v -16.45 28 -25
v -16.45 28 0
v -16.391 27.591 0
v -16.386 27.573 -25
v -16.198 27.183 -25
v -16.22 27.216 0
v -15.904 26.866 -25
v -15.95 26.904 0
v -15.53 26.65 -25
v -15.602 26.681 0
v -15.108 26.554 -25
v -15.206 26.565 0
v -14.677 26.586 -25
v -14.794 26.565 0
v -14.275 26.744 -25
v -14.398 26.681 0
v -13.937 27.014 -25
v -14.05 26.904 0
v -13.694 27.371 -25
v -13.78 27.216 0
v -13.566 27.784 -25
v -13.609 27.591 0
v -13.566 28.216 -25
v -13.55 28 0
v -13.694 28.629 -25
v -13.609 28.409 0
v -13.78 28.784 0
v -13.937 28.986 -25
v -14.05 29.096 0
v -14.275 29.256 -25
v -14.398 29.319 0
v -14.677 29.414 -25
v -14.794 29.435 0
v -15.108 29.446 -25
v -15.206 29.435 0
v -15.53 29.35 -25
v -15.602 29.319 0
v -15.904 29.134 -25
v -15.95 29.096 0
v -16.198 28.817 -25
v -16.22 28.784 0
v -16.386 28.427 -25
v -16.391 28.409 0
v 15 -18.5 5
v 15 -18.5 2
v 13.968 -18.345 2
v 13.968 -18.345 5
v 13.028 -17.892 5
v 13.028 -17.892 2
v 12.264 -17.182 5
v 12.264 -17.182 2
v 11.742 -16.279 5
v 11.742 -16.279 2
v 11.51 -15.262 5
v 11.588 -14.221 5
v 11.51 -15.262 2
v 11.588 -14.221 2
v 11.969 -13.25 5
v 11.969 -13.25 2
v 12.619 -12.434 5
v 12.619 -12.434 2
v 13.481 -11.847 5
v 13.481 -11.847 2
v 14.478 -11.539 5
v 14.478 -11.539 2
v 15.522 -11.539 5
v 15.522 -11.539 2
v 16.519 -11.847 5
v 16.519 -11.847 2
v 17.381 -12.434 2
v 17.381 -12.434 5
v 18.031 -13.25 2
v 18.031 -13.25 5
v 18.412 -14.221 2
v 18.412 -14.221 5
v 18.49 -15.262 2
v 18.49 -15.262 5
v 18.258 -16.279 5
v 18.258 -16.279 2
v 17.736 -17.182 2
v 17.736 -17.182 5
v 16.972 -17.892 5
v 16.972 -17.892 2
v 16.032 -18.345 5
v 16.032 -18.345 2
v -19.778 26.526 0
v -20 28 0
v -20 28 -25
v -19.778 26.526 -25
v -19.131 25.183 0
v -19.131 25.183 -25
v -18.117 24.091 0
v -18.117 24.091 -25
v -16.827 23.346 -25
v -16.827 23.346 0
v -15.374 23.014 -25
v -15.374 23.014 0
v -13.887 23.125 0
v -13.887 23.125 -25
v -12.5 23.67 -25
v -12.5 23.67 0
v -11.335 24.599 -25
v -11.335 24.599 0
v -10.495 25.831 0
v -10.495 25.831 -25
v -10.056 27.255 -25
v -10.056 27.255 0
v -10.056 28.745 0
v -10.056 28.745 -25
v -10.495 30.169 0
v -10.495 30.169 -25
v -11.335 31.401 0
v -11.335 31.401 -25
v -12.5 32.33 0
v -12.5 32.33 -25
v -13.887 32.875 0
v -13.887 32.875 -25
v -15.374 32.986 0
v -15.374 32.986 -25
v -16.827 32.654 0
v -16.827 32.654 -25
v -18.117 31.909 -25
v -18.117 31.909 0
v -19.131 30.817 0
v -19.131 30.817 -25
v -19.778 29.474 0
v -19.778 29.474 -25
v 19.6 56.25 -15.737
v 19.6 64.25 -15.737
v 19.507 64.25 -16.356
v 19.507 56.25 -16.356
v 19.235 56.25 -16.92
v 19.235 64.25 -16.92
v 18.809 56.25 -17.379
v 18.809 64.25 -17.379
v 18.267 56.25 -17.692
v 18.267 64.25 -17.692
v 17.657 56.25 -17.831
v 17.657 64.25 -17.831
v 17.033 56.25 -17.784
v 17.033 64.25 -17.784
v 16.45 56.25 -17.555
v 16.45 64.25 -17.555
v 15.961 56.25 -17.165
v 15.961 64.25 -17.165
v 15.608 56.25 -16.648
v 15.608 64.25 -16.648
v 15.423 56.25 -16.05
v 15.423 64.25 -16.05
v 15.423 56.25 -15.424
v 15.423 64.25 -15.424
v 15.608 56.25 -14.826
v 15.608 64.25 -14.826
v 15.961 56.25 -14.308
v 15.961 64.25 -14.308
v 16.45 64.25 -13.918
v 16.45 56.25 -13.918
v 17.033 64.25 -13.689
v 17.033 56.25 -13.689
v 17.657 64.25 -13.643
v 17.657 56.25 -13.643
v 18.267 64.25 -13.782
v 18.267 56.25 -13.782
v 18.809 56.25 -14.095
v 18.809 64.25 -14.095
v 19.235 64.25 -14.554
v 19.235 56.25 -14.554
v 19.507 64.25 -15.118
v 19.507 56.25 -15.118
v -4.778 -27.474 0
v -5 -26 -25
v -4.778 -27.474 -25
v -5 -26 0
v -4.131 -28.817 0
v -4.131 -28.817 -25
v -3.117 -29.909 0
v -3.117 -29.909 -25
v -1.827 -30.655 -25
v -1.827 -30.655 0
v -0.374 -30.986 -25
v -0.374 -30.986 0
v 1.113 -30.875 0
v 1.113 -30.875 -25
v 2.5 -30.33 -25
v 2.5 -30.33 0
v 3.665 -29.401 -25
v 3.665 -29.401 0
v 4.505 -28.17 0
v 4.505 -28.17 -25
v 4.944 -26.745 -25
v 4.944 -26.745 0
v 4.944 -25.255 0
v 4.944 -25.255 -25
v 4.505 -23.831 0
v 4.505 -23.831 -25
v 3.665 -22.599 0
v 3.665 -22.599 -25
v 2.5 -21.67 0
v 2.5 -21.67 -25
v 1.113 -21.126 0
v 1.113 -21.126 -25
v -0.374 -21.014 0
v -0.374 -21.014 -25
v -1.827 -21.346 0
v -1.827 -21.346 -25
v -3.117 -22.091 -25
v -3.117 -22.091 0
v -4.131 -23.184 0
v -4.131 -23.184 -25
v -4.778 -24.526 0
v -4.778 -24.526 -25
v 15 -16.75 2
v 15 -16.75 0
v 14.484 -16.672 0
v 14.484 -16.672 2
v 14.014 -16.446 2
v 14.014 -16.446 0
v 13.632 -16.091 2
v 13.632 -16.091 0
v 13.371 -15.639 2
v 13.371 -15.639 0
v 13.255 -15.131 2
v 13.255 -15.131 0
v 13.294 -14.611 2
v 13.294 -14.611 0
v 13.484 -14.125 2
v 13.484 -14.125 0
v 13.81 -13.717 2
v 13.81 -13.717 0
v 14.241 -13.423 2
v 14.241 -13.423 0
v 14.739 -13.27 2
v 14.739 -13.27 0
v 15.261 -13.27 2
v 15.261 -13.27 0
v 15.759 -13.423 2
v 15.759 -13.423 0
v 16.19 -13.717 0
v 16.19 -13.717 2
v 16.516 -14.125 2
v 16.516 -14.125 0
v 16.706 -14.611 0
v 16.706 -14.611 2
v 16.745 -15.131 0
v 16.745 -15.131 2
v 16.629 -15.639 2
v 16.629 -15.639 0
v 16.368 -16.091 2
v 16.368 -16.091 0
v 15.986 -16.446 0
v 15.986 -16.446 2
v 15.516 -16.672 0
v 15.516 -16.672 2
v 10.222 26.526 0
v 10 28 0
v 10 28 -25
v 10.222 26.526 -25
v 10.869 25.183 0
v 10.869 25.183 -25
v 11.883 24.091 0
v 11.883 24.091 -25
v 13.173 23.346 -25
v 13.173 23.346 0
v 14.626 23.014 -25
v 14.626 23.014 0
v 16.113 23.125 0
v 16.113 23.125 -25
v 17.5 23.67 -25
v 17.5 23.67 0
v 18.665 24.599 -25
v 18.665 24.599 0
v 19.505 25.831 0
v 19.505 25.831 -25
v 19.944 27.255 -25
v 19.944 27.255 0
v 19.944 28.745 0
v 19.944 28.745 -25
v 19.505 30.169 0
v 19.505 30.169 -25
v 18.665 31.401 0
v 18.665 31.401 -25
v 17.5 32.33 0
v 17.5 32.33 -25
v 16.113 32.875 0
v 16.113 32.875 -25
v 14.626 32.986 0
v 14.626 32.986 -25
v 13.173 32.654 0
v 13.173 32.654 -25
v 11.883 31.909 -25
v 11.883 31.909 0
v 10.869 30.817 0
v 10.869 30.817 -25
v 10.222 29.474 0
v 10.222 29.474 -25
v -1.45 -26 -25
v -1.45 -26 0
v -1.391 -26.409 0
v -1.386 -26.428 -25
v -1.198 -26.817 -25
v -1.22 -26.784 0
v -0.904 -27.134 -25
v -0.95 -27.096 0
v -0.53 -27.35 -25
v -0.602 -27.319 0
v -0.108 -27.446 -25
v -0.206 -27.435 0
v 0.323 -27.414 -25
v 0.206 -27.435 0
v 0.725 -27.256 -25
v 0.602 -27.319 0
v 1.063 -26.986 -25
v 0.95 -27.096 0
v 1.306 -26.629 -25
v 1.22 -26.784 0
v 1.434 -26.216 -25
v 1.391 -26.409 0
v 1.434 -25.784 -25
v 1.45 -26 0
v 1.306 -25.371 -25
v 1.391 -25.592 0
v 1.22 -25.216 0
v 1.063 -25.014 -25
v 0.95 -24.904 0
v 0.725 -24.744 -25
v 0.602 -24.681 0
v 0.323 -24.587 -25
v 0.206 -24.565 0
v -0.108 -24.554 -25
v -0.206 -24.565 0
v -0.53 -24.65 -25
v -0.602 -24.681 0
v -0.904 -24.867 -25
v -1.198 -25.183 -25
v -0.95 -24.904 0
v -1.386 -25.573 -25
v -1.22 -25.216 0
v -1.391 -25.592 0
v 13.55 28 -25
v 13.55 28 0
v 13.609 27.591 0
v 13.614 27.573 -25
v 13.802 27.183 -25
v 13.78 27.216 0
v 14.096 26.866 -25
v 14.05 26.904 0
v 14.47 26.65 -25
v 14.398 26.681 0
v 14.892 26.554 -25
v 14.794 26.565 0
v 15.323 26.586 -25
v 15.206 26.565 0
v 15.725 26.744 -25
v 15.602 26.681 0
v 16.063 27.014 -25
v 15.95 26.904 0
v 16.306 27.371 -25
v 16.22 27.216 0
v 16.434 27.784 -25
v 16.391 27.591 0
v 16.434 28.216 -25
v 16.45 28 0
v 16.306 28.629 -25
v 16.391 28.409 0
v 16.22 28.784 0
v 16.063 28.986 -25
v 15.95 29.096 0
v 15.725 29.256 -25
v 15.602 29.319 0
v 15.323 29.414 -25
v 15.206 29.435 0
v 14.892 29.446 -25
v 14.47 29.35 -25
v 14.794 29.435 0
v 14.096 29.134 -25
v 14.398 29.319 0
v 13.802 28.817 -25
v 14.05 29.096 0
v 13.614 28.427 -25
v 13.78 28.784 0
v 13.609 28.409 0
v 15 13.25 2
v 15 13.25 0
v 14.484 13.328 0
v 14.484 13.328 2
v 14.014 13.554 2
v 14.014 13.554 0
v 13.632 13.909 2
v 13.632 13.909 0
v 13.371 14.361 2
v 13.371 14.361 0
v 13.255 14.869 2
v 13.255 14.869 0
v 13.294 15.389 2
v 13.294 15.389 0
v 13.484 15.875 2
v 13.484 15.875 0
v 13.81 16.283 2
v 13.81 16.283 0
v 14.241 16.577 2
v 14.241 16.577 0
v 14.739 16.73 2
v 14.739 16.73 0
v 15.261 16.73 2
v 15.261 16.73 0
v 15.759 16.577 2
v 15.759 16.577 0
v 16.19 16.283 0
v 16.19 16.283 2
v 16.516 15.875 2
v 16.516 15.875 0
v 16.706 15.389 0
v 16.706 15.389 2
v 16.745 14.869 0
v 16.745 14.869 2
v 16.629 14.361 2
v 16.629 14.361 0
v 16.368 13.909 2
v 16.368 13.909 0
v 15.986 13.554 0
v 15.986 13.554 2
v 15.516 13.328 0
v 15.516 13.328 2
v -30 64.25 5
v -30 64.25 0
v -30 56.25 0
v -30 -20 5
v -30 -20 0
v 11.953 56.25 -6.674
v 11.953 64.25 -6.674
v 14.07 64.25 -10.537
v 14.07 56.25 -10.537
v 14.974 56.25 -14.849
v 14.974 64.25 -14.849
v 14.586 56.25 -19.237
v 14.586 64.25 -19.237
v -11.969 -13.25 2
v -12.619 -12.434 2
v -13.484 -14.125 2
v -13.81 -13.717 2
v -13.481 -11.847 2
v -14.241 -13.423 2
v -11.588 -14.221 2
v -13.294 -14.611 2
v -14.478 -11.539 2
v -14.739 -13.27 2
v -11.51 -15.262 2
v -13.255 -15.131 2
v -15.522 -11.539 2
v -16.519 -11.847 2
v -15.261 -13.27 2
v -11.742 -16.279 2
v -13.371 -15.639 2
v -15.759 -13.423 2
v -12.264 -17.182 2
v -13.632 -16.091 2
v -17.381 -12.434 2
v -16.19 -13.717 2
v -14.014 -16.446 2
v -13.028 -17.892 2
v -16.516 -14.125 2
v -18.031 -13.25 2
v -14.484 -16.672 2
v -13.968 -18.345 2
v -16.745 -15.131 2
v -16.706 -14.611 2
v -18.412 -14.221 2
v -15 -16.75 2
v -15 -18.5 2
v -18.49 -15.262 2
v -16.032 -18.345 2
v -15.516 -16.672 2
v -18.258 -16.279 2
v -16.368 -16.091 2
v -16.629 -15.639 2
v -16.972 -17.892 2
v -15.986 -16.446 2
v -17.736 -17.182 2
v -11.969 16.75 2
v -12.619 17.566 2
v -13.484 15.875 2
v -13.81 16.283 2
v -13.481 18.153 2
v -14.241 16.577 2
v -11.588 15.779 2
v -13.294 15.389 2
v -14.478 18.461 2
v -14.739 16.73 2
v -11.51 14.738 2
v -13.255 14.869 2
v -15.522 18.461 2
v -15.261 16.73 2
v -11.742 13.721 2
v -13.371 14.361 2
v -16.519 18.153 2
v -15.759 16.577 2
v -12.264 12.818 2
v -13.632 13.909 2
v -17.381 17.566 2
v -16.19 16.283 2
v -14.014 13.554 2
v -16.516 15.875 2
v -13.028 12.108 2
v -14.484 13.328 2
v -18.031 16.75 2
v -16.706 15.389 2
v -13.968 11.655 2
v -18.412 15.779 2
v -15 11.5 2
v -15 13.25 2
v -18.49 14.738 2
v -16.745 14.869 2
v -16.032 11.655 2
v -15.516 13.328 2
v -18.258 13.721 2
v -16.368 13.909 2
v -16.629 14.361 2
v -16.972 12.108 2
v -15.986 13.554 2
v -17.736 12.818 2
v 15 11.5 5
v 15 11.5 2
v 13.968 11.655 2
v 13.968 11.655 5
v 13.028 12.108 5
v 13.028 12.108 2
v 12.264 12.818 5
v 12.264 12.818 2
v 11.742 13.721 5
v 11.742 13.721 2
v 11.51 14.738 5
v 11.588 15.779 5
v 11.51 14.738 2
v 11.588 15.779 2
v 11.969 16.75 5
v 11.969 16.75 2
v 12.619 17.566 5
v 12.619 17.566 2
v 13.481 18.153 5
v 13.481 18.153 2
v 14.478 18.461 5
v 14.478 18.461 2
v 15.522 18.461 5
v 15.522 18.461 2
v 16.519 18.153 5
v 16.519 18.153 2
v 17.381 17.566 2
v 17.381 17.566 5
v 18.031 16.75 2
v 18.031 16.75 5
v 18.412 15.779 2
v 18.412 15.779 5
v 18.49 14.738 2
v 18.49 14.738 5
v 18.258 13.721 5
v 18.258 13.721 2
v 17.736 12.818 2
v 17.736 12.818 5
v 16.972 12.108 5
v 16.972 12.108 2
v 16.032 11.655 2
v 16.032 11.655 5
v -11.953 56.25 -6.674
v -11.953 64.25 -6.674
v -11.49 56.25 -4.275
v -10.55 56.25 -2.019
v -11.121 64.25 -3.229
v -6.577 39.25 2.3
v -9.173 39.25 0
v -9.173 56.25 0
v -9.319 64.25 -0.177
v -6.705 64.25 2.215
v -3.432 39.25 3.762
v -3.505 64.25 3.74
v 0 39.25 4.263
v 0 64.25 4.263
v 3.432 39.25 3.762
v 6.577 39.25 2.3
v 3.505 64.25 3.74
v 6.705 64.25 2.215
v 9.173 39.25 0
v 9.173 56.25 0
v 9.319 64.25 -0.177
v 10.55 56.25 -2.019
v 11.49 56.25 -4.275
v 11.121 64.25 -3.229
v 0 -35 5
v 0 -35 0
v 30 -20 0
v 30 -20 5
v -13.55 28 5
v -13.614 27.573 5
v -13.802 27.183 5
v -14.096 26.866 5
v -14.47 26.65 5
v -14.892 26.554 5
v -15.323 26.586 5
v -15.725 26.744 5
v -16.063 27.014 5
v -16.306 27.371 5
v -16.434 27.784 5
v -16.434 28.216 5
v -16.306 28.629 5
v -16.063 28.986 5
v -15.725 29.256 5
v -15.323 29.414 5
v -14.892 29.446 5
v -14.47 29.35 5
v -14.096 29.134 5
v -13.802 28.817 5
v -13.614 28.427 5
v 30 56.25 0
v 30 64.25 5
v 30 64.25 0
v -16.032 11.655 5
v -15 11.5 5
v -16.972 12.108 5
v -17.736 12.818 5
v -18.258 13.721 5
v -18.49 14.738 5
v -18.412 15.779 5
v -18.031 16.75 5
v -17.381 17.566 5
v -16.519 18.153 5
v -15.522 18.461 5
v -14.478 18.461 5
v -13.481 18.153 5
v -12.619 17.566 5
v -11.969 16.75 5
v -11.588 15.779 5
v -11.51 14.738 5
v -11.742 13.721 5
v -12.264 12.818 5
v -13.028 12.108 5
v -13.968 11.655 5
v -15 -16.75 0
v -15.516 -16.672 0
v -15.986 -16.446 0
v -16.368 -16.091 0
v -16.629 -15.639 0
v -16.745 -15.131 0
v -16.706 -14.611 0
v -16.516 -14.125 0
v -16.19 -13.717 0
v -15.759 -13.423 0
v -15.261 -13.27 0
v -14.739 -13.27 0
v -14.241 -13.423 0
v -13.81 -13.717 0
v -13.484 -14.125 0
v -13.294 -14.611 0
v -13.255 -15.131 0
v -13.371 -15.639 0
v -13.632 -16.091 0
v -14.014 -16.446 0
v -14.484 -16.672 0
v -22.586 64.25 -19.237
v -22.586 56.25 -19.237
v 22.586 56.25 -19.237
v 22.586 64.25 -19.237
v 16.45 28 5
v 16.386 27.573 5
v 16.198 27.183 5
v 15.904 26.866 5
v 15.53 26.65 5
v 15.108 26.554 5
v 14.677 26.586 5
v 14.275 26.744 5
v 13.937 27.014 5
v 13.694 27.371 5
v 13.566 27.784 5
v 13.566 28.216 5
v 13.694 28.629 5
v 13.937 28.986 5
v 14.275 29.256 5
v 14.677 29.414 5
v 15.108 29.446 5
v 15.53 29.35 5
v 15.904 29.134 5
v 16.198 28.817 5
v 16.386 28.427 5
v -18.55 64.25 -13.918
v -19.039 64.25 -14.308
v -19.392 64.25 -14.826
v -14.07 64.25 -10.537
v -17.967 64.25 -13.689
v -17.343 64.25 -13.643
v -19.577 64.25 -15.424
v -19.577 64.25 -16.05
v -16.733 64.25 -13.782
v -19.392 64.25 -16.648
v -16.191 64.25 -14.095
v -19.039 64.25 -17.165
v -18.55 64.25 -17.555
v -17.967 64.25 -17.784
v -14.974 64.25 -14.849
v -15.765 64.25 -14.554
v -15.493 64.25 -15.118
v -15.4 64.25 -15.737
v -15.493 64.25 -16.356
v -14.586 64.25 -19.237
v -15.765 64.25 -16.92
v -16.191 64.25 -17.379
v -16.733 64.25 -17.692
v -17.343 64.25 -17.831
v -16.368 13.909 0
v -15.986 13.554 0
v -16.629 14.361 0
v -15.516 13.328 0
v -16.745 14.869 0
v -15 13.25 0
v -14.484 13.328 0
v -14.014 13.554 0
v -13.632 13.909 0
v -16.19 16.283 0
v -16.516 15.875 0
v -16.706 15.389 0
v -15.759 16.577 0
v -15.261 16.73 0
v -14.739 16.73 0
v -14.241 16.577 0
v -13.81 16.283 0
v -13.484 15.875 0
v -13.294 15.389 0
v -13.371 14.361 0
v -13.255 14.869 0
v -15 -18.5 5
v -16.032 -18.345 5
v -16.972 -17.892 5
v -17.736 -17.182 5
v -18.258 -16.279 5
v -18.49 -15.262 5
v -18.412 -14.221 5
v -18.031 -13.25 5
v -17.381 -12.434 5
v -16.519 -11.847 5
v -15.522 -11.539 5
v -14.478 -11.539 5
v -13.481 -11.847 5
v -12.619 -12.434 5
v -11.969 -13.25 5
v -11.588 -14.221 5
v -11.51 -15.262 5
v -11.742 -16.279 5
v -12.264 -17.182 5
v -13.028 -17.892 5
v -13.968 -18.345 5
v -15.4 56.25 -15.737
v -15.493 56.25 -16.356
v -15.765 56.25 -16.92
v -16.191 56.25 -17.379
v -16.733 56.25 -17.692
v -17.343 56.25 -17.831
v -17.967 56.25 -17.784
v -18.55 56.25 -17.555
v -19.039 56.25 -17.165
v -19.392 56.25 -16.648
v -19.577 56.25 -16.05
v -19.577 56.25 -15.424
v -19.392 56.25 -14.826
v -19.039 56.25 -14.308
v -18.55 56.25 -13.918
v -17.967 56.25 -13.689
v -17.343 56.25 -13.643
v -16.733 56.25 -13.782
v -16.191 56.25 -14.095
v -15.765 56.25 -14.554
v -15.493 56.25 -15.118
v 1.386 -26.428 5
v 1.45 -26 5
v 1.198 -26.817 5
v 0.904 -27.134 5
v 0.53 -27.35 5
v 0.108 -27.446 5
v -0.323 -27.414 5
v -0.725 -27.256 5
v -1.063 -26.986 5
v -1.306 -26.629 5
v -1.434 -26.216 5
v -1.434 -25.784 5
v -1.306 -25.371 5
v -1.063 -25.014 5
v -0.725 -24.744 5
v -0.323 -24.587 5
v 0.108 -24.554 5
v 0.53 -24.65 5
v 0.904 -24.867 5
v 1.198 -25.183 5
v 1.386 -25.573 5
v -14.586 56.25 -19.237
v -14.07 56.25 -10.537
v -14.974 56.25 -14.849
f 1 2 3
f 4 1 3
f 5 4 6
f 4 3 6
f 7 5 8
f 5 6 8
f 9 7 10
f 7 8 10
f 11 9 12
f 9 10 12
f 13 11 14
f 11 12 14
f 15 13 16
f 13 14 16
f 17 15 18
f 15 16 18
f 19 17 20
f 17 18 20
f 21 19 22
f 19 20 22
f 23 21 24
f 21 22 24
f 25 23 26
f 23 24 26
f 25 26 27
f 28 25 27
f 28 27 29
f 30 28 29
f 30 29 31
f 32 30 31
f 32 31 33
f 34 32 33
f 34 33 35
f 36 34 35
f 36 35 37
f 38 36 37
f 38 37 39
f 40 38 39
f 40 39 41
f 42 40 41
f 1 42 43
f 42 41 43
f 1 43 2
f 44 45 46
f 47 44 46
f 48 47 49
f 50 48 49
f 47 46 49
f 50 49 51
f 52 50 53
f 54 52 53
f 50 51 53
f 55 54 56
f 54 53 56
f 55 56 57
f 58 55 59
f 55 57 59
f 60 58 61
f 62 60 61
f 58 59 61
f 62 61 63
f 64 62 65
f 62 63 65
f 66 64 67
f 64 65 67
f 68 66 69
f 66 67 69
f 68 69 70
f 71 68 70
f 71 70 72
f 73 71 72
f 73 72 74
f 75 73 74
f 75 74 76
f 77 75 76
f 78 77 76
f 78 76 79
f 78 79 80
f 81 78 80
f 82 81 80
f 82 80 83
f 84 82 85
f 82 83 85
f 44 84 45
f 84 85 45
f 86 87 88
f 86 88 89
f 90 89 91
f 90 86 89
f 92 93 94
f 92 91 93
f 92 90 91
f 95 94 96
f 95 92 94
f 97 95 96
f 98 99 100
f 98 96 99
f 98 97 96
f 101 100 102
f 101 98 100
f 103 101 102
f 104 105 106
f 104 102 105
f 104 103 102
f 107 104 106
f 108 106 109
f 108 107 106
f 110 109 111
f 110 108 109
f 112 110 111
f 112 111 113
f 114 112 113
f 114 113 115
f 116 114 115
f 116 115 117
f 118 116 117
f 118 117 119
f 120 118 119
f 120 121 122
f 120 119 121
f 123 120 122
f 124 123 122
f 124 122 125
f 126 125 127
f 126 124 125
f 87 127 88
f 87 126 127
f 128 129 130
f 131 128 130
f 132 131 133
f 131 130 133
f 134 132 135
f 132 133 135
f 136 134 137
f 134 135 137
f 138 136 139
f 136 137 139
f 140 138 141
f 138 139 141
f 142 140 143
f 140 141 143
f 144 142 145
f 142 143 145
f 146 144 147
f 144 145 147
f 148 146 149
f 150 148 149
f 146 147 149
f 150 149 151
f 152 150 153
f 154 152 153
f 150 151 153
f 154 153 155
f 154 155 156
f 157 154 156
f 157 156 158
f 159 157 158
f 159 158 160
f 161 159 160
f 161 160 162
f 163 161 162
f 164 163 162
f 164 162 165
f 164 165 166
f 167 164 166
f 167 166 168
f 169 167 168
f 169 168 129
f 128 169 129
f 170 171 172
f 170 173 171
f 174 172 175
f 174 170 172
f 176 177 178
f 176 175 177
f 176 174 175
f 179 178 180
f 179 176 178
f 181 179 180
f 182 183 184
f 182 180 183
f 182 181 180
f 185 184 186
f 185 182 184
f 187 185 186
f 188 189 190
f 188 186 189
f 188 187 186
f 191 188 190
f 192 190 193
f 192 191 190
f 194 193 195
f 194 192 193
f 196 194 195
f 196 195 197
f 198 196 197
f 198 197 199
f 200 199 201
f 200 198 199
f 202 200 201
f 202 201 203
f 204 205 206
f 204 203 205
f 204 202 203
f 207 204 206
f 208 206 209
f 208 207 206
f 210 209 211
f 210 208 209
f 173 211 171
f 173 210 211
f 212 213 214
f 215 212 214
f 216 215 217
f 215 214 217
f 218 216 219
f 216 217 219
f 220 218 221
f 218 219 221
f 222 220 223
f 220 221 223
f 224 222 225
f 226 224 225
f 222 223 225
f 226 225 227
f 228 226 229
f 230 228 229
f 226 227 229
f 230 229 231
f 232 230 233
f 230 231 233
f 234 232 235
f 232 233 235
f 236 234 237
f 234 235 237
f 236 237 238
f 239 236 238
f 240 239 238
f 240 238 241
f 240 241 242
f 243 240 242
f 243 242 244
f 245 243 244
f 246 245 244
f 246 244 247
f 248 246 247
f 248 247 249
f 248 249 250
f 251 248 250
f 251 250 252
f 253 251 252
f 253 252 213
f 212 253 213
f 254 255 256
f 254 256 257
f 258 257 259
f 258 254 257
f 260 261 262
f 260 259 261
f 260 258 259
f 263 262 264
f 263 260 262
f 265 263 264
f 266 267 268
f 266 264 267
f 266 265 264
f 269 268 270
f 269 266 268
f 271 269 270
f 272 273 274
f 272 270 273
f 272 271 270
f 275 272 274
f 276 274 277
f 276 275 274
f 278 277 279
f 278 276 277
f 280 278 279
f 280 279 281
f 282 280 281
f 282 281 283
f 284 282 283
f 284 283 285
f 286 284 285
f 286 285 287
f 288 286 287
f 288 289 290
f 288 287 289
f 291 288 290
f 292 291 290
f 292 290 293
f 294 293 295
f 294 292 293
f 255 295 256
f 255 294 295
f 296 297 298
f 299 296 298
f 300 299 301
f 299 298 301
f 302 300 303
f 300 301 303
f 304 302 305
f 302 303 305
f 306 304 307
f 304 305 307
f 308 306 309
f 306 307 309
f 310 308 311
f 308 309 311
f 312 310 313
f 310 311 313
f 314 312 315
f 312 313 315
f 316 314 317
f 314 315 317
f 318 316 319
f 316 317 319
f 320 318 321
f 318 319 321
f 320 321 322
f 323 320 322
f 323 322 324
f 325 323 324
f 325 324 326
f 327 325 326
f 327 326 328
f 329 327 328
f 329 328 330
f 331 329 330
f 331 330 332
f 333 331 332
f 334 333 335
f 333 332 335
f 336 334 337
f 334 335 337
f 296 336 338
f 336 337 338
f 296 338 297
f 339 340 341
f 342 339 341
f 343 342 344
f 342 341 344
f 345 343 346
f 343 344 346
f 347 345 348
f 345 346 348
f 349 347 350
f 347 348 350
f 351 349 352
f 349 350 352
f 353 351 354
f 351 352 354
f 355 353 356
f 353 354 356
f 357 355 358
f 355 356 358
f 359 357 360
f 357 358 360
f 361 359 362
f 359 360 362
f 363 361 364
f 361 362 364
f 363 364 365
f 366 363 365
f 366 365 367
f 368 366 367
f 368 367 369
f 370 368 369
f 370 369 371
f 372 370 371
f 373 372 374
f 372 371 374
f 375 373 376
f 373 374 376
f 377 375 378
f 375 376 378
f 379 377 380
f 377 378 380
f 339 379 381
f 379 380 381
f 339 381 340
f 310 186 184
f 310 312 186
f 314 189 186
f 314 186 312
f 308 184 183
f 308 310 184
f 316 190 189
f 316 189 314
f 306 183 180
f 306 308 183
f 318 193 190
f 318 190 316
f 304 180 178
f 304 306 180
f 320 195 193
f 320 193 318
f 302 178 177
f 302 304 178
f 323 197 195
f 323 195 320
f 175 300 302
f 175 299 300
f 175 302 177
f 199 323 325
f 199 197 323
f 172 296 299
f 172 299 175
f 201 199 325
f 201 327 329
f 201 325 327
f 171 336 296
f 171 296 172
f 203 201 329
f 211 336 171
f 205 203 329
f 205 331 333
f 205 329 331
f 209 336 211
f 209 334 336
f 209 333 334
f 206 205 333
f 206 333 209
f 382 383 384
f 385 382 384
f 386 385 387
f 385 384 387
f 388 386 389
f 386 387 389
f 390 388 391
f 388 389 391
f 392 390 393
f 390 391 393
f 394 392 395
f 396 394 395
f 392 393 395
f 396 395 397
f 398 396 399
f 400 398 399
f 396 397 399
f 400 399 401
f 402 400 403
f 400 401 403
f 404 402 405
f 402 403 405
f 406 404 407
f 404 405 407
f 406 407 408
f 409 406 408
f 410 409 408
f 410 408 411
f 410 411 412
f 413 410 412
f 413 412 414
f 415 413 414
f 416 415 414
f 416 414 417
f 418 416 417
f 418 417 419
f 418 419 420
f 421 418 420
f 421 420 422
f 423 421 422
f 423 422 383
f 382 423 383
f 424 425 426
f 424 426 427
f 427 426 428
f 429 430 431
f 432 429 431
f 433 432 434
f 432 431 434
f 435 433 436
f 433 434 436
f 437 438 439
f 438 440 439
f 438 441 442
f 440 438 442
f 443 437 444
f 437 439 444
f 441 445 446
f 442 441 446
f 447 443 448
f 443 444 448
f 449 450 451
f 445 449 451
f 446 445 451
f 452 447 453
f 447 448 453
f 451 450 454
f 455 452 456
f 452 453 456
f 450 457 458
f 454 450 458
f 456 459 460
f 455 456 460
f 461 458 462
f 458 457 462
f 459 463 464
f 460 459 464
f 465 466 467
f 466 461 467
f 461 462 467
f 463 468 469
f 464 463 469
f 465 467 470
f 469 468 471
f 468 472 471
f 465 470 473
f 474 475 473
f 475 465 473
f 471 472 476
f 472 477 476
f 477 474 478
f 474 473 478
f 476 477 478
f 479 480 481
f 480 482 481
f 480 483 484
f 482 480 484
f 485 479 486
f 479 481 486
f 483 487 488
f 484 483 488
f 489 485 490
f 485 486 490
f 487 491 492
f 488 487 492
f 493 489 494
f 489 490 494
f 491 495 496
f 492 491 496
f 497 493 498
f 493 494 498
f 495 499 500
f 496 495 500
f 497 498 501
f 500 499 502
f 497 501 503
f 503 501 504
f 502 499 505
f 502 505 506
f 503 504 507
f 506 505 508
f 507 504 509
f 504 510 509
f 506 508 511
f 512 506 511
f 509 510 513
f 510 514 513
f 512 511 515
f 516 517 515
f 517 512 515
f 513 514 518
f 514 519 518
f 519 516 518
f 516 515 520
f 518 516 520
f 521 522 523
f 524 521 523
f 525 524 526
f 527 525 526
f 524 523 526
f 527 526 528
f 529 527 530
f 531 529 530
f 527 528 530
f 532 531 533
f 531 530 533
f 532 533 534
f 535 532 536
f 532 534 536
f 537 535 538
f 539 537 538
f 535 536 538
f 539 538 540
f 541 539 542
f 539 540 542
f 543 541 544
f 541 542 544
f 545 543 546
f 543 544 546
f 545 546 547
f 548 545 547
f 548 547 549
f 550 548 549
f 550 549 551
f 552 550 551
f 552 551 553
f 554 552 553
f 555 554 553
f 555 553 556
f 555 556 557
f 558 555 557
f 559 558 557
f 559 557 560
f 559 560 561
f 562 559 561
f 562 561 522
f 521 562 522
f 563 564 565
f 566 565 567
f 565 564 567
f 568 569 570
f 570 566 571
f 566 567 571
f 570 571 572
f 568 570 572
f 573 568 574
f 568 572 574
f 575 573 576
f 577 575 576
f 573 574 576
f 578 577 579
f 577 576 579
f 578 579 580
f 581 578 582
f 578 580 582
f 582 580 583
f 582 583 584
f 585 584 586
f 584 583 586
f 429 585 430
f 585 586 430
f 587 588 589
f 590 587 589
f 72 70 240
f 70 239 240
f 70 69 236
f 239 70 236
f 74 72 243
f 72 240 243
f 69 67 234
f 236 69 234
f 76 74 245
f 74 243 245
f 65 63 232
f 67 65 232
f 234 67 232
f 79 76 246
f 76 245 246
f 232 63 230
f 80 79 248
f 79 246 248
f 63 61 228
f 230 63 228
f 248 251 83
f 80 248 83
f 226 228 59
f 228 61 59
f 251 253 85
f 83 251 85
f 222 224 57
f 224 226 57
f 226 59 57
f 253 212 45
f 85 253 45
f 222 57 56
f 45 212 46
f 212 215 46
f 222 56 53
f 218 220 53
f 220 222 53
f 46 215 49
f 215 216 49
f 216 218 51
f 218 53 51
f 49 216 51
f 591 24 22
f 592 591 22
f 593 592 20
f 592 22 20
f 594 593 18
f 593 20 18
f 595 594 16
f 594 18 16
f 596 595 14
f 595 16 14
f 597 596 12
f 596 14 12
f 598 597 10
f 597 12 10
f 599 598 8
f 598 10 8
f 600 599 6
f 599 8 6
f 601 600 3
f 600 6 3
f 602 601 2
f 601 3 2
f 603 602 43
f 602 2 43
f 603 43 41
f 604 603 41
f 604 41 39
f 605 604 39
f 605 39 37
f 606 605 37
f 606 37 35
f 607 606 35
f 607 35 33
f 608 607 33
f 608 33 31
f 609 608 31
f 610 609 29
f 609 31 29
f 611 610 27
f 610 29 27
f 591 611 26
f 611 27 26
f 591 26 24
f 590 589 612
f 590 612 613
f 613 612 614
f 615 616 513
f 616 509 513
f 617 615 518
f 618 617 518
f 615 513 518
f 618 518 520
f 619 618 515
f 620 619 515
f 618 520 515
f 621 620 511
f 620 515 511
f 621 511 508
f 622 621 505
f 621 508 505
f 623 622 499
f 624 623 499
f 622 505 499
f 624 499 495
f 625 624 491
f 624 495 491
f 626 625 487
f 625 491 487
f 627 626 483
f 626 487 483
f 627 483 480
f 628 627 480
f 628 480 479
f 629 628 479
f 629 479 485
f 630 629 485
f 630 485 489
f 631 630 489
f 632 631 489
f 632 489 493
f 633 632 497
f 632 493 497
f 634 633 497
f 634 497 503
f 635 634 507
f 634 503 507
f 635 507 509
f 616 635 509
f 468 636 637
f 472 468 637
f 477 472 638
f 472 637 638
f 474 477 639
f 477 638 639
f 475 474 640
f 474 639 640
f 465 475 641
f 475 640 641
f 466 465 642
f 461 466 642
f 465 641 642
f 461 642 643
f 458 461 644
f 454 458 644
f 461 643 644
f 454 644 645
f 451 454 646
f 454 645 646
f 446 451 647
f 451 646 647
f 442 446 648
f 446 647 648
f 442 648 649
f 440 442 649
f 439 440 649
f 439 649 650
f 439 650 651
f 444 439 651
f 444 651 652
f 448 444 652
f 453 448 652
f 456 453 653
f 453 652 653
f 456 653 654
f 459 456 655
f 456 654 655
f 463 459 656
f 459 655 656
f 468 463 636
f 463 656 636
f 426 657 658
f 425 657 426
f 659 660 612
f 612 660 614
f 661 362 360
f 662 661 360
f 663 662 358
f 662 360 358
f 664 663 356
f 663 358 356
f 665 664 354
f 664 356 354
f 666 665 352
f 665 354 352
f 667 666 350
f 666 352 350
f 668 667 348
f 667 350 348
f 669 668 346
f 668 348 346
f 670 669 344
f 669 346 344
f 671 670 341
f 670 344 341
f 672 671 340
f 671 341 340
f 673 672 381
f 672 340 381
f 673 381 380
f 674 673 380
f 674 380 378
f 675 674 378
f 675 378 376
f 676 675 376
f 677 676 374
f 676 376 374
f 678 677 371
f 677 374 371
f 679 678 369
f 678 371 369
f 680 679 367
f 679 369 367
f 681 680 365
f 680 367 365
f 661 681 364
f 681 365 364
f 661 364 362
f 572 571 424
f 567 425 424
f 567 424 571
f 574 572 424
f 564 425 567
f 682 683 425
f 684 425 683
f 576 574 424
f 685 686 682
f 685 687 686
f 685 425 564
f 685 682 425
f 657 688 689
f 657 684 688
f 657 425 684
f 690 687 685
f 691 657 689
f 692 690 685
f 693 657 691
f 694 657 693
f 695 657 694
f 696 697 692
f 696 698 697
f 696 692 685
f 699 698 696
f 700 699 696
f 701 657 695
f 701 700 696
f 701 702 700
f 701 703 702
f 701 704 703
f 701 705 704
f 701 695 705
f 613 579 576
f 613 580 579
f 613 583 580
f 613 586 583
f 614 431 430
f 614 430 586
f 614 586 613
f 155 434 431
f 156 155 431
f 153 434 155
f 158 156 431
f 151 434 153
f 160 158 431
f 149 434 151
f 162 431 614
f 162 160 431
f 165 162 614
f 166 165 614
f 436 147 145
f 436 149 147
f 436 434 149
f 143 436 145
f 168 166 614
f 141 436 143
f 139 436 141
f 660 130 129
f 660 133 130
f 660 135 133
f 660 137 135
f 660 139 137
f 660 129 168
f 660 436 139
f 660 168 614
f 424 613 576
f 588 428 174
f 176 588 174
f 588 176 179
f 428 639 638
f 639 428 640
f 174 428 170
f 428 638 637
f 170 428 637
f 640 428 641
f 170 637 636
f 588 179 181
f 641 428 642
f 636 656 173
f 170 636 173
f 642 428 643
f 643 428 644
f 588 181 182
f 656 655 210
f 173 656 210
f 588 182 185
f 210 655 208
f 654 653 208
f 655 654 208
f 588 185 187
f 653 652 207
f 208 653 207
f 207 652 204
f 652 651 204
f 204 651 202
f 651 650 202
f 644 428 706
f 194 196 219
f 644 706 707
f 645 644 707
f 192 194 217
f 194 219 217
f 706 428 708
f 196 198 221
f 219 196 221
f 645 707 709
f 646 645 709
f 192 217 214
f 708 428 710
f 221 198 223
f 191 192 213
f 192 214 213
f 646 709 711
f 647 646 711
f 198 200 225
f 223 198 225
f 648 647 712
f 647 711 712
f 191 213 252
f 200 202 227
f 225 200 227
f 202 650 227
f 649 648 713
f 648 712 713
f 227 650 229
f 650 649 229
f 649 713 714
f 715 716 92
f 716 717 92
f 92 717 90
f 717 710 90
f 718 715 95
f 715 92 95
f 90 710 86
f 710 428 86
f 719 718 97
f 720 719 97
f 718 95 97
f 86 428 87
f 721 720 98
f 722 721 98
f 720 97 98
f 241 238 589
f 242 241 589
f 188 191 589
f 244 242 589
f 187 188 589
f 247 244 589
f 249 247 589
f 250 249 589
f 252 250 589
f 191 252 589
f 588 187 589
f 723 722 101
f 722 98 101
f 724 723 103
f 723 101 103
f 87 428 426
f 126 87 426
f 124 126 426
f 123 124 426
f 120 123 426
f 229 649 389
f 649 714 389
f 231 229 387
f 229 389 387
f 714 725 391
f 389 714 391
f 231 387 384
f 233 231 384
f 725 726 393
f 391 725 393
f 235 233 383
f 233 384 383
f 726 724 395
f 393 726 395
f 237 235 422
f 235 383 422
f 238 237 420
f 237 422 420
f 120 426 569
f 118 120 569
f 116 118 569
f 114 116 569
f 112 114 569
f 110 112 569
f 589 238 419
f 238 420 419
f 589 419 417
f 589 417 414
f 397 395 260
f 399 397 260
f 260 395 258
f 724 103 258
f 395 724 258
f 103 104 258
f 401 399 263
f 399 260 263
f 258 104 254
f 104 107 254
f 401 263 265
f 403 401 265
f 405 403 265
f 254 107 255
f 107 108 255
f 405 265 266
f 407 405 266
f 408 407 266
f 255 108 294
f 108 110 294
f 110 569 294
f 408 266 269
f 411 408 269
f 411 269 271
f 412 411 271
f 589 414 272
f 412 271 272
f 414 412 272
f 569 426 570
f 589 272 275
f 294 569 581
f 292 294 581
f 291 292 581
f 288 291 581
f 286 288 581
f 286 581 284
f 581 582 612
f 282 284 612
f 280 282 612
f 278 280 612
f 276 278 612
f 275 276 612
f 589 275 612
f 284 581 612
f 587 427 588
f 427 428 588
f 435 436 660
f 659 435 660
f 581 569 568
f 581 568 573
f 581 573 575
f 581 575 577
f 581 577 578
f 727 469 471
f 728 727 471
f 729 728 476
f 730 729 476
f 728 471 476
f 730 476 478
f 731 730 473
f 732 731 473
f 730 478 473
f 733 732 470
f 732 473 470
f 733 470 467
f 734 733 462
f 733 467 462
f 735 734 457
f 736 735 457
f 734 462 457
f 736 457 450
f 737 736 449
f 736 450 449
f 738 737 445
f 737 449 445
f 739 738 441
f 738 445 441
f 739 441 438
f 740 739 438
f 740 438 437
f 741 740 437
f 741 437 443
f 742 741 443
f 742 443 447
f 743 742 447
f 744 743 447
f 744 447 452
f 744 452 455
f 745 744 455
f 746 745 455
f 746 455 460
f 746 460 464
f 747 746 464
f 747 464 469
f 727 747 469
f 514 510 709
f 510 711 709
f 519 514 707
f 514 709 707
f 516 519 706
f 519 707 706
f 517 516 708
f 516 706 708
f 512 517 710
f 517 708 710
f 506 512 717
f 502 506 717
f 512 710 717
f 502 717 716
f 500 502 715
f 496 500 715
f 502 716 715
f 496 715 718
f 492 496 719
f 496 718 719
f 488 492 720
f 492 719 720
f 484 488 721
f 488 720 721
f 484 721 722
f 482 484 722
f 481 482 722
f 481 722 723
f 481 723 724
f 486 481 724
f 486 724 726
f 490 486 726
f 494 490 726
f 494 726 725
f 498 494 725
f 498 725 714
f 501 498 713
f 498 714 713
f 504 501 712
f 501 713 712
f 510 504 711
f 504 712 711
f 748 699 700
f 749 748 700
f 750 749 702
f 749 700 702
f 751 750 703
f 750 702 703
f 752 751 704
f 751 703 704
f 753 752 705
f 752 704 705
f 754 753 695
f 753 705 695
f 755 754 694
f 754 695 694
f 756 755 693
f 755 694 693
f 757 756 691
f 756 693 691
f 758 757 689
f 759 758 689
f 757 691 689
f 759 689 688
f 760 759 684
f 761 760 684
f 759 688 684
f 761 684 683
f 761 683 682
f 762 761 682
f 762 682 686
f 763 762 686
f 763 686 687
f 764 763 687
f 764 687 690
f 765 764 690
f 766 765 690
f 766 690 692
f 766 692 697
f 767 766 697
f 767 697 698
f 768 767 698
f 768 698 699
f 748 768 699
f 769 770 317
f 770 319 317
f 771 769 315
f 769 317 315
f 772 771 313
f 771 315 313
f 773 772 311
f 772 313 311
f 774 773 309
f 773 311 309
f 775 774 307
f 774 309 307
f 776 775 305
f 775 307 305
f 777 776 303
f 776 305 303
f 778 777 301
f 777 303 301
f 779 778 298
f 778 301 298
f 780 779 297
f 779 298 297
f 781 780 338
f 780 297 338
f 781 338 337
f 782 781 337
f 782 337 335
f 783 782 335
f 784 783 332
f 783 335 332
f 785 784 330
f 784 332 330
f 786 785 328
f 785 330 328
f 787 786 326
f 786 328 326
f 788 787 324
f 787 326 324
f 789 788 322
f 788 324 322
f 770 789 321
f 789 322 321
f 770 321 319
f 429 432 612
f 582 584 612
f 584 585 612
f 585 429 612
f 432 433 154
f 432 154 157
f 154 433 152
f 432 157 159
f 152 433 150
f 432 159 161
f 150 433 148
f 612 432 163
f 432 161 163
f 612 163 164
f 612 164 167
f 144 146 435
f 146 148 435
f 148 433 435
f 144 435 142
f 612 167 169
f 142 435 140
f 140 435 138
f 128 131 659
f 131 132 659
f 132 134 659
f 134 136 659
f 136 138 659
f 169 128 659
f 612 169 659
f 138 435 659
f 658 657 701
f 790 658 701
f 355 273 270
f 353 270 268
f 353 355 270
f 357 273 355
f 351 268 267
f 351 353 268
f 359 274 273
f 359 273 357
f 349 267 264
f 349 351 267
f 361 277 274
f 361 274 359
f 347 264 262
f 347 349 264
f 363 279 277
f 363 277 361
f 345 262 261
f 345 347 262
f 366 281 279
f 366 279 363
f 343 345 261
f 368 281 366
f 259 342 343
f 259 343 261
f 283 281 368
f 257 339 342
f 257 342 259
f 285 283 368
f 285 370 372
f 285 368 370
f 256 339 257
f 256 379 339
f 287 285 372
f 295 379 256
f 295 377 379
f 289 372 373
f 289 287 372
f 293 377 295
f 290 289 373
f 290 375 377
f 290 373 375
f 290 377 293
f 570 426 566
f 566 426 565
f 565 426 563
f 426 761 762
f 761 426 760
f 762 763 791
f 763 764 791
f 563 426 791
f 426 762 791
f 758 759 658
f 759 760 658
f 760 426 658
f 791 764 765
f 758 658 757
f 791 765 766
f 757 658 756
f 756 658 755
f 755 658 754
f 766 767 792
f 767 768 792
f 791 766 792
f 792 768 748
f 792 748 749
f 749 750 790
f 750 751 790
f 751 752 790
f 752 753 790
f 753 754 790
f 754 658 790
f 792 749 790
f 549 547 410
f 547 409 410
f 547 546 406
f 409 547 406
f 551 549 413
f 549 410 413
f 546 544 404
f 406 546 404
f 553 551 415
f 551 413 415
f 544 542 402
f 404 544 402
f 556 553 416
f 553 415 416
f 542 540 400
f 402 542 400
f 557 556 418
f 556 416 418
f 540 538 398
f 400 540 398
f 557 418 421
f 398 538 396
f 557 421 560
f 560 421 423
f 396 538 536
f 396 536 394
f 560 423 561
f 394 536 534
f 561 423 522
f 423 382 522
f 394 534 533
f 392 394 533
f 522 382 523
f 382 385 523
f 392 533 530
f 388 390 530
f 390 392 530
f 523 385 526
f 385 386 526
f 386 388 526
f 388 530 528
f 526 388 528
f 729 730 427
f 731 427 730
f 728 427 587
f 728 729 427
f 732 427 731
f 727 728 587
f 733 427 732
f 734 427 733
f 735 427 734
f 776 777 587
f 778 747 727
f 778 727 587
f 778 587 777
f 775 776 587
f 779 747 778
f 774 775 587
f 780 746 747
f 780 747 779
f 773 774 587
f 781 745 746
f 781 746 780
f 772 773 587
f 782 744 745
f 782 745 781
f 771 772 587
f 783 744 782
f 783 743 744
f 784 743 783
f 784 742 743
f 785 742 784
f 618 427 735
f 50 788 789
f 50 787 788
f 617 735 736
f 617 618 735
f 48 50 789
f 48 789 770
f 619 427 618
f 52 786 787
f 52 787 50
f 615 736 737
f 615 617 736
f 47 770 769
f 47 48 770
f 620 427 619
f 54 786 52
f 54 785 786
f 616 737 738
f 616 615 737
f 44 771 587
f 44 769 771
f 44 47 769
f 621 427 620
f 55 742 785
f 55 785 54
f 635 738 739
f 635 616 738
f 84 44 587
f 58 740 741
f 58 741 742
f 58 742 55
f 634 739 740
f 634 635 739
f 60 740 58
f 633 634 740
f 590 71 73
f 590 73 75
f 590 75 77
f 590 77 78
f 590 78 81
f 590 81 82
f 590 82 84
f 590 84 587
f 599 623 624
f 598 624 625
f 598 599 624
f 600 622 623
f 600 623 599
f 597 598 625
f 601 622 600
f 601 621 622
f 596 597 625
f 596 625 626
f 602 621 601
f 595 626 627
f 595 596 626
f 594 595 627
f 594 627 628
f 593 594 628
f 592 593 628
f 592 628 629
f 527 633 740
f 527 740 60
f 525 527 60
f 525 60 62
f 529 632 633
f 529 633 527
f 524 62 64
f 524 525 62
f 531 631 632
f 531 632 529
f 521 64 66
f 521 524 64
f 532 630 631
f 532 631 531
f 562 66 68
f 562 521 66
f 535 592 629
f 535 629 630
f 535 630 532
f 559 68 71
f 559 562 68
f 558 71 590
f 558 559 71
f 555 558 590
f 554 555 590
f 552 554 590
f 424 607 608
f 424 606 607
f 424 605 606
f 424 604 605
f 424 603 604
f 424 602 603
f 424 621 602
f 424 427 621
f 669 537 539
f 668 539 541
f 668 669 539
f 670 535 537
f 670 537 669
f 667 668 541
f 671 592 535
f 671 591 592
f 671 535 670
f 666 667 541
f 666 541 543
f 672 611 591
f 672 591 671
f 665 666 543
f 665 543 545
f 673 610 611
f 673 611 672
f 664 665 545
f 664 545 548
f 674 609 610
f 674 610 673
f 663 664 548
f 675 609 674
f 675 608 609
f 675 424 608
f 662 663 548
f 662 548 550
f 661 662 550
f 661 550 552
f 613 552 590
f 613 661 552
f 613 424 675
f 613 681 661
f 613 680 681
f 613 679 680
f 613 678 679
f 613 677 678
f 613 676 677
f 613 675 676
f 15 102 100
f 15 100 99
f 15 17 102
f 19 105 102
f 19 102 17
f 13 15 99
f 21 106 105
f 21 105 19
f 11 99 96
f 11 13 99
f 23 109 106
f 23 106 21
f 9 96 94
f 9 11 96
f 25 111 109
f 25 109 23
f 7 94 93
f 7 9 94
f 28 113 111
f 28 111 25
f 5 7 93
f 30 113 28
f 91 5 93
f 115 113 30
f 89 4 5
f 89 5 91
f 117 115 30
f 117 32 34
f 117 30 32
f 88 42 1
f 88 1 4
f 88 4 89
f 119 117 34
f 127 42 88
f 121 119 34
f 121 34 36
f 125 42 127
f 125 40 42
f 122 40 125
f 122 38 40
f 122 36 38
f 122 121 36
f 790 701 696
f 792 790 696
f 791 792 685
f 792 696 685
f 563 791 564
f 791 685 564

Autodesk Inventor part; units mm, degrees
ref_plane "YZ Plane" through (0, 0, 0) normal (1, 0, 0) x (0, 1, 0)
ref_plane "XZ Plane" through (0, 0, 0) normal (0, 1, 0) x (-1, 0, 0)
ref_plane "XY Plane" through (0, 0, 0) normal (0, 0, 1) x (1, 0, 0)
ref_plane "Work Plane1" through (0, 0, 0) normal (0, 0, 1) x (1, 0, 0)
sketch "Sketch1" plane through (0, 0, 0) normal (0, 0, 1) x (1, 0, 0)
  circle A0 centre (-15, -15) radius 1.5 projected
  circle A1 centre (15, 15) radius 1.5 projected
  circle A2 centre (15, -15) radius 1.5 projected
  circle A3 centre (-15, 15) radius 1.5 projected
  line L0 (30, 20) -> (-30, 20) construction
  line L1 (-30, 20) -> (-30, -20) projected
  line L2 (-30, -20) -> (30, -20) projected
  line L3 (30, -20) -> (30, 20) projected
  line L4 (30, 20) -> (-30, 20)
  line L5 (-30, 20) -> (-30, 64.25)
  line L6 (-30, 64.25) -> (30, 64.25)
  line L7 (30, 64.25) -> (30, 20)
  line L8 (13.5554, 64.25) -> (17.5, 64.25) projected
  line L9 (-30, -20) -> (0, -35)
  line L10 (0, -35) -> (30, -20)
  line L11 (-0.0001, -26) -> (-15, 28) construction
  line L12 (-15, 28) -> (15, 28) construction
  line L13 (15, 28) -> (-0.0001, -26) construction
  circle A4 centre (-15, 28) radius 1.45
  circle A5 centre (15, 28) radius 1.45
  circle A6 centre (0, -26.0002) radius 1.45
  line L14 (-30, -20) -> (30, -20)
  line L15 (30, -20) -> (30, 20)
  line L16 (30, 20) -> (-30, 20)
  line L17 (-30, 20) -> (-30, -20)
  point P0 (0, 0)
  dimension "d19" = 15
  dimension "d20" = 2.9
  dimension "d21" = 2.9
  dimension "d22" = 2.9
  dimension "d23" = 30
  dimension "d24" = 28
  dimension "d30" = 0
  dimension "d31" = 26
extrude "Extrusion1" add sketch "Sketch1" along normal blind 5 contours A0 | A1 | A2 | A3 | L4 L3 L2 L1 | L5 L6 L7 L4 | L2 L10 L9
sketch "Sketch2" plane through (0, 0, 5) normal (0, 0, 1) x (1, 0, 0)
  circle A0 centre (15, 15) radius 1.5 projected
  circle A1 centre (15, -15) radius 1.5 projected
  circle A2 centre (-20, 13) radius 1.5 projected
  circle A3 centre (-20, -13) radius 1.5 projected
  circle A4 centre (-15, -15) radius 1.5 projected
  circle A5 centre (-15, 15) radius 1.5 projected
  point P0 (0, 0)
hole "Hole1" at (15, 15, 5) at (15, -15, 5) at (-15, -15, 5) at (-15, 15, 5) direction (0, 0, -1) diameter 3.5 depth 8 tip angle 118 counterbore diameter 7 counterbore depth 3
sketch "Sketch3" plane through (-30, 64.25, 0) normal (0, 1, 0) x (1, 0, 0)
  circle A0 centre (12.5, 15.7367) radius 2.1 projected
  circle A1 centre (47.5, 15.7367) radius 2.1 projected
  arc A2 (16, 15.7367) -> (44, 15.7367) centre (30, 15.7367) ccw projected
  circle A3 centre (30, 15.7367) radius 15
  line L0 (12.5, 19.2367) -> (16.4446, 19.2367) projected
  line L1 (43.5554, 19.2367) -> (47.5, 19.2367) projected
  line L2 (15.414, 19.2367) -> (7.414, 19.2367)
  line L3 (0, 0) -> (60, 0) projected
  line L4 (7.414, 19.2367) -> (0, 0)
  line L5 (0, 0) -> (60, 0)
  line L6 (44.586, 19.2367) -> (52.586, 19.2367)
  line L7 (52.586, 19.2367) -> (60, 0)
  circle A4 centre (12.5, 15.7367) radius 1.45
  circle A5 centre (47.5, 15.7367) radius 1.45
  point P0 (30, 0)
  dimension "d9" = 30
  dimension "d10" = 8
  dimension "d11" = 8
  dimension "d12" = 2.9
  dimension "d13" = 2.9
extrude "Extrusion2" add sketch "Sketch3" against normal blind 8 contours A3 L1 L6 L7 L3 L4 L2 L0
sketch "Sketch4" plane through (-30, 64.25, 5) normal (0, 1, 0) x (1, 0, 0)
  circle A0 centre (30, 12.7367) radius 10 projected
  circle A1 centre (30, 12.7367) radius 12
  point P0 (30, 5)
  dimension "d16" = 24
extrude "Extrusion3" cut sketch "Sketch4" against normal blind 25 contours A0 | A1
sketch "Sketch5" plane through (0, 0, 0) normal (0, 0, -1) x (-1, 0, 0)
  circle A0 centre (15, 15) radius 1.75 projected
  circle A1 centre (-15, -15) radius 1.75 projected
  circle A2 centre (-15, 15) radius 1.75 projected
  circle A3 centre (15, -15) radius 1.75 projected
  line L0 (9.173, 56.25) -> (9.173, 39.25) projected
  line L1 (9.173, 39.25) -> (-9.173, 39.25) projected
  line L2 (-9.173, 39.25) -> (-9.173, 56.25) projected
  line L3 (-9.173, 56.25) -> (-30, 56.25) projected
  line L4 (-30, -20) -> (-30, 56.25) projected
  line L5 (0, -35) -> (-30, -20) projected
  line L6 (30, -20) -> (0, -35) projected
  line L7 (30, 56.25) -> (9.173, 56.25) projected
  line L8 (30, -20) -> (30, 56.25) projected
  circle A4 centre (15, 28) radius 1.45 projected
  circle A5 centre (-15, 28) radius 1.45 projected
  circle A6 centre (0, -26.0002) radius 1.45 projected
  circle A7 centre (15, 28) radius 1.45 projected
  circle A8 centre (15, 28) radius 5
  circle A9 centre (-15, 28) radius 5
  circle A10 centre (0, -26.0002) radius 5
  point P0 (0, 0)
  dimension "d25" = 10
  dimension "d26" = 10
  dimension "d27" = 10
extrude "Extrusion4" add sketch "Sketch5" along normal blind 25 contours A8 | A9 | A10
properties part number "01_WG_writer_BASE"
